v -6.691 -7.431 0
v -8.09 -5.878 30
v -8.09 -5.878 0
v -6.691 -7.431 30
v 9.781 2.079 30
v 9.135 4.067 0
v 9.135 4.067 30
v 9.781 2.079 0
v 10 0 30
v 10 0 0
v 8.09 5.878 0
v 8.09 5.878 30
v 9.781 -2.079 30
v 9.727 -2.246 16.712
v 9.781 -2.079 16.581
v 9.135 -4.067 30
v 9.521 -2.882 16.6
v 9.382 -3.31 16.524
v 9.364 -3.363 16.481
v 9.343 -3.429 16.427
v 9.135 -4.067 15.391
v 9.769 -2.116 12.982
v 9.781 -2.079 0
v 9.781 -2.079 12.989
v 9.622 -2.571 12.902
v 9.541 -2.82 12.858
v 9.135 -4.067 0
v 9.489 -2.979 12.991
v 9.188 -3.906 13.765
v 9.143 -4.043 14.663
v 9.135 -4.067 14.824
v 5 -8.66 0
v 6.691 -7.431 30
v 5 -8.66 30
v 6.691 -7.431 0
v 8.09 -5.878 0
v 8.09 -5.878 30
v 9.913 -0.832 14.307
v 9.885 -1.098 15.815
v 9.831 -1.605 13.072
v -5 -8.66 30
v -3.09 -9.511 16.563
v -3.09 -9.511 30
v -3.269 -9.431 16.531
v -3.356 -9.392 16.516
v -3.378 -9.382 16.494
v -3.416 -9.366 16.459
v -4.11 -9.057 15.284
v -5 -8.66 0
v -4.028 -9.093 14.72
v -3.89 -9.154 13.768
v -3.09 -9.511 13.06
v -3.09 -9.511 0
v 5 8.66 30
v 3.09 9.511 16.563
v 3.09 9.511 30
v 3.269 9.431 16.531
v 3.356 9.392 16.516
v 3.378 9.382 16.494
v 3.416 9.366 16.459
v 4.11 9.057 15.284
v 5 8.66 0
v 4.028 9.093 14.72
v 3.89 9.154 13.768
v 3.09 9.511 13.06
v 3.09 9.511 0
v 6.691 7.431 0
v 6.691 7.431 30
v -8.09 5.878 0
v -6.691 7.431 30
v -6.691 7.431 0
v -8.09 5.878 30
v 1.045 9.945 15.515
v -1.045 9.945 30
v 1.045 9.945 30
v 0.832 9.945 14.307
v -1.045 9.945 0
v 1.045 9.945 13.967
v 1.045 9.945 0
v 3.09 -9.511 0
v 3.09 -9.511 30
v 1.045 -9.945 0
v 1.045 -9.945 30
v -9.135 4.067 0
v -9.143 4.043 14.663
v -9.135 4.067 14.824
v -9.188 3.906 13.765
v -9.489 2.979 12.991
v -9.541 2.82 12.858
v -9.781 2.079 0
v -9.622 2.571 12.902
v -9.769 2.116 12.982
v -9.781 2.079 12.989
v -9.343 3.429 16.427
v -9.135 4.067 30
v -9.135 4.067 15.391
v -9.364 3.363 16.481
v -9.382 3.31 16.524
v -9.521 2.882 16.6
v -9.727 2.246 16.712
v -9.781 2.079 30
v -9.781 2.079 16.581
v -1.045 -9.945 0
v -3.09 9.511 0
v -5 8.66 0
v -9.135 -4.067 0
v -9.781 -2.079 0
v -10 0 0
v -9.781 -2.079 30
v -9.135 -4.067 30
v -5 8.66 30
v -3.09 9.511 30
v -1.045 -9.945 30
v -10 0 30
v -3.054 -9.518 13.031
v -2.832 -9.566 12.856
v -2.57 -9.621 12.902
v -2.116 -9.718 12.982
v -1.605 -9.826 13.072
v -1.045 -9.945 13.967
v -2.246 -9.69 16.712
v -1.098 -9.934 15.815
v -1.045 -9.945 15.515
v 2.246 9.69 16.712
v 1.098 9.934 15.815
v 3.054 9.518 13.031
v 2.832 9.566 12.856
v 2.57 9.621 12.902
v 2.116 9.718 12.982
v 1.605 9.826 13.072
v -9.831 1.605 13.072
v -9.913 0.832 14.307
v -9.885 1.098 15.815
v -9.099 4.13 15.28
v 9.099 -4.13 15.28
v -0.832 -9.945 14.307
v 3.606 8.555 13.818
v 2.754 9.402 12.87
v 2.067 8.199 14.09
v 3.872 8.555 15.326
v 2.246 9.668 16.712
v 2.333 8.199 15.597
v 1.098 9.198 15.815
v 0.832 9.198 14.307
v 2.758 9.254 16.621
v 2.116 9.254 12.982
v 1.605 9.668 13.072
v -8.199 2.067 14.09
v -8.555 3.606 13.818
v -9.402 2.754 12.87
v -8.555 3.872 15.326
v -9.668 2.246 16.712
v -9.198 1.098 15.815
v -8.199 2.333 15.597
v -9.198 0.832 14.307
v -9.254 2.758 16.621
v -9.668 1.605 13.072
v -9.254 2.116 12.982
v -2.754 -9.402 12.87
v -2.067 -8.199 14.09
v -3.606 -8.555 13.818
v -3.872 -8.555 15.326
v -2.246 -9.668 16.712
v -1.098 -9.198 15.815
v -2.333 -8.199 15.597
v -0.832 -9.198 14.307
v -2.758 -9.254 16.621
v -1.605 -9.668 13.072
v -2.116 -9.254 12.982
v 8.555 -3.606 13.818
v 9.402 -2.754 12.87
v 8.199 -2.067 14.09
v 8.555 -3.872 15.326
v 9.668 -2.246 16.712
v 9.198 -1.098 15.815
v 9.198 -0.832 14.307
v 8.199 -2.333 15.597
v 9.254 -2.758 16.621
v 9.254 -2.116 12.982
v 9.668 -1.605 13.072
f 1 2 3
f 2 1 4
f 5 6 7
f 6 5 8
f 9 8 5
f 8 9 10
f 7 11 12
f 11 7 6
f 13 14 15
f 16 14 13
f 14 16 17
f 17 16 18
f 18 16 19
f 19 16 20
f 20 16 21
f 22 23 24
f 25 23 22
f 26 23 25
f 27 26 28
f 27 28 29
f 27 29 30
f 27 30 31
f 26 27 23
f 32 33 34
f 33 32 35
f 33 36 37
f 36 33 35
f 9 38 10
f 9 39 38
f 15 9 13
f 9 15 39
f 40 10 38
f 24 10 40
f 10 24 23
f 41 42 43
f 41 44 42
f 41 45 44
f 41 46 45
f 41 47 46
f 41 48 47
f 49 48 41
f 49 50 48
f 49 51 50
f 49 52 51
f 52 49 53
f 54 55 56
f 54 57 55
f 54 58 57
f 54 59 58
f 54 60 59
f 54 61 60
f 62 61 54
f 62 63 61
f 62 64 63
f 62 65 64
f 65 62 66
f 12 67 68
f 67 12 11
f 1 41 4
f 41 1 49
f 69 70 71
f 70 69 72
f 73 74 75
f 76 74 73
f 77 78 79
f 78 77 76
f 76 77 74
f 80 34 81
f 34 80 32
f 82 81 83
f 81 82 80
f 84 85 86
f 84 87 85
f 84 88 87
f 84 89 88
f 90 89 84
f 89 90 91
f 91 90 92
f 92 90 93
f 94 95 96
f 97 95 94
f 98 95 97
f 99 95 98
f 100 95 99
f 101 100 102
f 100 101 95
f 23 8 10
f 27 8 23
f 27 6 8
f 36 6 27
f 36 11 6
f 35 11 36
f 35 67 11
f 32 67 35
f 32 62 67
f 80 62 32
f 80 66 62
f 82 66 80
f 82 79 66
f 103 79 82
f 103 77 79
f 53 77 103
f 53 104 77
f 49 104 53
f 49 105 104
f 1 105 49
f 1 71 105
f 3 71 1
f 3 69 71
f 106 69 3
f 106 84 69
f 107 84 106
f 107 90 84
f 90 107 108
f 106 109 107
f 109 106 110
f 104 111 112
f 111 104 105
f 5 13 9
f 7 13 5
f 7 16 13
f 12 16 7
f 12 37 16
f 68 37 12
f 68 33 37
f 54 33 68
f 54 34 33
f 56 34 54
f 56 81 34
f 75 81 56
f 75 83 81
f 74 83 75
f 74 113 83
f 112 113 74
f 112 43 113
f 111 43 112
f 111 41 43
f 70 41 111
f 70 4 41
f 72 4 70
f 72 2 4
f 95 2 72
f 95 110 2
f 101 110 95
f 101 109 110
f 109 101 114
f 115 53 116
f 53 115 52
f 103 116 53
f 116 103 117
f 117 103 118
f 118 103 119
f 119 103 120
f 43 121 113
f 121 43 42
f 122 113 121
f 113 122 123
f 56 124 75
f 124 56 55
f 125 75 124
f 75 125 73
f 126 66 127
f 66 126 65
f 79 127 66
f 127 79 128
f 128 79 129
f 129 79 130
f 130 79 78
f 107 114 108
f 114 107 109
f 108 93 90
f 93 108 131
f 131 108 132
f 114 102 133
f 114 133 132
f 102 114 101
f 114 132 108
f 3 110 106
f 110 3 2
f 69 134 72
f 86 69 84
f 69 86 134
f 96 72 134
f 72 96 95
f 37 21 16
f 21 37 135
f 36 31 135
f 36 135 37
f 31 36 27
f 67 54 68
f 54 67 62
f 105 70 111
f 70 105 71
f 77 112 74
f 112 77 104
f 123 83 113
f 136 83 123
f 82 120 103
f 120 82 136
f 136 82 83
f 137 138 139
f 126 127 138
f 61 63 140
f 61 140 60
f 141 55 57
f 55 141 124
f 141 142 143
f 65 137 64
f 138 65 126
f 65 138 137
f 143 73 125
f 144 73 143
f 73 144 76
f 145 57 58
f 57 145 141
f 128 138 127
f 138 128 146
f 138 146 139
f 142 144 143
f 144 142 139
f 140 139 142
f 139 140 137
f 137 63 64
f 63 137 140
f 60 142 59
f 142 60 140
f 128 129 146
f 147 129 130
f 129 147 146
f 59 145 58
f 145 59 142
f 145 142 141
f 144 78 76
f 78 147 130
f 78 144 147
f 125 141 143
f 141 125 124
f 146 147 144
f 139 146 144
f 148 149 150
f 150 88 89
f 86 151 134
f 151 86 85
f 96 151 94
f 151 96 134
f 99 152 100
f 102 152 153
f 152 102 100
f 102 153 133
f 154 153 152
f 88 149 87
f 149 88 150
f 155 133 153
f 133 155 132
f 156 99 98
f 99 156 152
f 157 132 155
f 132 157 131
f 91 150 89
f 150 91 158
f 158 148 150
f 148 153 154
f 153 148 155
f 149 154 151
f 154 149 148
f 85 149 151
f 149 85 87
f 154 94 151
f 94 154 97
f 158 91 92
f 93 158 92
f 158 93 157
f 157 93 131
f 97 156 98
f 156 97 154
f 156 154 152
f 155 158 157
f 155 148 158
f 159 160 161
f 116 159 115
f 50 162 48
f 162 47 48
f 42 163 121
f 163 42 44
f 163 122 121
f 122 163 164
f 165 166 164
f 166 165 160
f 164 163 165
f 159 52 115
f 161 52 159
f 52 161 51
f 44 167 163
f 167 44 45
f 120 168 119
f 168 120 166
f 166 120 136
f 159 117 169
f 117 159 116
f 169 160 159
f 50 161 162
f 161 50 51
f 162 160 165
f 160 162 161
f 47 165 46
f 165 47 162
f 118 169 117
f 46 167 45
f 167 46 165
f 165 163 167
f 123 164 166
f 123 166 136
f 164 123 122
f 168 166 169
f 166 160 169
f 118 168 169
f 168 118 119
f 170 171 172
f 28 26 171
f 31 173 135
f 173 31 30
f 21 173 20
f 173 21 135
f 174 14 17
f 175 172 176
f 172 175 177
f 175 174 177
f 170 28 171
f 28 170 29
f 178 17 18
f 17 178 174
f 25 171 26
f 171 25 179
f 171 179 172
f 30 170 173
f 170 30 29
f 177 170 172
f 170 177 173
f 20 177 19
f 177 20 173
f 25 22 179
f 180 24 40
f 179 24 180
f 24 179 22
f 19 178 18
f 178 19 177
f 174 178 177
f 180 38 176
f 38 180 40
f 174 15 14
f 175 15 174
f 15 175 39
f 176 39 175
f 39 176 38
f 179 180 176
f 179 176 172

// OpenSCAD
translate([0.0,0.0,0.0])scale([1.0,1.0,1.0])rotate([0.0,0.0,0.0])  difference()  {
cylinder(r=10.0,h=30.0);
rotate([0.0,10.0,0.0])  translate([0.0,10.0,15.0])sphere(r = 2.0);
rotate([0.0,10.0,90.0])  translate([0.0,10.0,15.0])sphere(r = 2.0);
rotate([0.0,10.0,180.0])  translate([0.0,10.0,15.0])sphere(r = 2.0);
rotate([0.0,10.0,270.0])  translate([0.0,10.0,15.0])sphere(r = 2.0);
}
